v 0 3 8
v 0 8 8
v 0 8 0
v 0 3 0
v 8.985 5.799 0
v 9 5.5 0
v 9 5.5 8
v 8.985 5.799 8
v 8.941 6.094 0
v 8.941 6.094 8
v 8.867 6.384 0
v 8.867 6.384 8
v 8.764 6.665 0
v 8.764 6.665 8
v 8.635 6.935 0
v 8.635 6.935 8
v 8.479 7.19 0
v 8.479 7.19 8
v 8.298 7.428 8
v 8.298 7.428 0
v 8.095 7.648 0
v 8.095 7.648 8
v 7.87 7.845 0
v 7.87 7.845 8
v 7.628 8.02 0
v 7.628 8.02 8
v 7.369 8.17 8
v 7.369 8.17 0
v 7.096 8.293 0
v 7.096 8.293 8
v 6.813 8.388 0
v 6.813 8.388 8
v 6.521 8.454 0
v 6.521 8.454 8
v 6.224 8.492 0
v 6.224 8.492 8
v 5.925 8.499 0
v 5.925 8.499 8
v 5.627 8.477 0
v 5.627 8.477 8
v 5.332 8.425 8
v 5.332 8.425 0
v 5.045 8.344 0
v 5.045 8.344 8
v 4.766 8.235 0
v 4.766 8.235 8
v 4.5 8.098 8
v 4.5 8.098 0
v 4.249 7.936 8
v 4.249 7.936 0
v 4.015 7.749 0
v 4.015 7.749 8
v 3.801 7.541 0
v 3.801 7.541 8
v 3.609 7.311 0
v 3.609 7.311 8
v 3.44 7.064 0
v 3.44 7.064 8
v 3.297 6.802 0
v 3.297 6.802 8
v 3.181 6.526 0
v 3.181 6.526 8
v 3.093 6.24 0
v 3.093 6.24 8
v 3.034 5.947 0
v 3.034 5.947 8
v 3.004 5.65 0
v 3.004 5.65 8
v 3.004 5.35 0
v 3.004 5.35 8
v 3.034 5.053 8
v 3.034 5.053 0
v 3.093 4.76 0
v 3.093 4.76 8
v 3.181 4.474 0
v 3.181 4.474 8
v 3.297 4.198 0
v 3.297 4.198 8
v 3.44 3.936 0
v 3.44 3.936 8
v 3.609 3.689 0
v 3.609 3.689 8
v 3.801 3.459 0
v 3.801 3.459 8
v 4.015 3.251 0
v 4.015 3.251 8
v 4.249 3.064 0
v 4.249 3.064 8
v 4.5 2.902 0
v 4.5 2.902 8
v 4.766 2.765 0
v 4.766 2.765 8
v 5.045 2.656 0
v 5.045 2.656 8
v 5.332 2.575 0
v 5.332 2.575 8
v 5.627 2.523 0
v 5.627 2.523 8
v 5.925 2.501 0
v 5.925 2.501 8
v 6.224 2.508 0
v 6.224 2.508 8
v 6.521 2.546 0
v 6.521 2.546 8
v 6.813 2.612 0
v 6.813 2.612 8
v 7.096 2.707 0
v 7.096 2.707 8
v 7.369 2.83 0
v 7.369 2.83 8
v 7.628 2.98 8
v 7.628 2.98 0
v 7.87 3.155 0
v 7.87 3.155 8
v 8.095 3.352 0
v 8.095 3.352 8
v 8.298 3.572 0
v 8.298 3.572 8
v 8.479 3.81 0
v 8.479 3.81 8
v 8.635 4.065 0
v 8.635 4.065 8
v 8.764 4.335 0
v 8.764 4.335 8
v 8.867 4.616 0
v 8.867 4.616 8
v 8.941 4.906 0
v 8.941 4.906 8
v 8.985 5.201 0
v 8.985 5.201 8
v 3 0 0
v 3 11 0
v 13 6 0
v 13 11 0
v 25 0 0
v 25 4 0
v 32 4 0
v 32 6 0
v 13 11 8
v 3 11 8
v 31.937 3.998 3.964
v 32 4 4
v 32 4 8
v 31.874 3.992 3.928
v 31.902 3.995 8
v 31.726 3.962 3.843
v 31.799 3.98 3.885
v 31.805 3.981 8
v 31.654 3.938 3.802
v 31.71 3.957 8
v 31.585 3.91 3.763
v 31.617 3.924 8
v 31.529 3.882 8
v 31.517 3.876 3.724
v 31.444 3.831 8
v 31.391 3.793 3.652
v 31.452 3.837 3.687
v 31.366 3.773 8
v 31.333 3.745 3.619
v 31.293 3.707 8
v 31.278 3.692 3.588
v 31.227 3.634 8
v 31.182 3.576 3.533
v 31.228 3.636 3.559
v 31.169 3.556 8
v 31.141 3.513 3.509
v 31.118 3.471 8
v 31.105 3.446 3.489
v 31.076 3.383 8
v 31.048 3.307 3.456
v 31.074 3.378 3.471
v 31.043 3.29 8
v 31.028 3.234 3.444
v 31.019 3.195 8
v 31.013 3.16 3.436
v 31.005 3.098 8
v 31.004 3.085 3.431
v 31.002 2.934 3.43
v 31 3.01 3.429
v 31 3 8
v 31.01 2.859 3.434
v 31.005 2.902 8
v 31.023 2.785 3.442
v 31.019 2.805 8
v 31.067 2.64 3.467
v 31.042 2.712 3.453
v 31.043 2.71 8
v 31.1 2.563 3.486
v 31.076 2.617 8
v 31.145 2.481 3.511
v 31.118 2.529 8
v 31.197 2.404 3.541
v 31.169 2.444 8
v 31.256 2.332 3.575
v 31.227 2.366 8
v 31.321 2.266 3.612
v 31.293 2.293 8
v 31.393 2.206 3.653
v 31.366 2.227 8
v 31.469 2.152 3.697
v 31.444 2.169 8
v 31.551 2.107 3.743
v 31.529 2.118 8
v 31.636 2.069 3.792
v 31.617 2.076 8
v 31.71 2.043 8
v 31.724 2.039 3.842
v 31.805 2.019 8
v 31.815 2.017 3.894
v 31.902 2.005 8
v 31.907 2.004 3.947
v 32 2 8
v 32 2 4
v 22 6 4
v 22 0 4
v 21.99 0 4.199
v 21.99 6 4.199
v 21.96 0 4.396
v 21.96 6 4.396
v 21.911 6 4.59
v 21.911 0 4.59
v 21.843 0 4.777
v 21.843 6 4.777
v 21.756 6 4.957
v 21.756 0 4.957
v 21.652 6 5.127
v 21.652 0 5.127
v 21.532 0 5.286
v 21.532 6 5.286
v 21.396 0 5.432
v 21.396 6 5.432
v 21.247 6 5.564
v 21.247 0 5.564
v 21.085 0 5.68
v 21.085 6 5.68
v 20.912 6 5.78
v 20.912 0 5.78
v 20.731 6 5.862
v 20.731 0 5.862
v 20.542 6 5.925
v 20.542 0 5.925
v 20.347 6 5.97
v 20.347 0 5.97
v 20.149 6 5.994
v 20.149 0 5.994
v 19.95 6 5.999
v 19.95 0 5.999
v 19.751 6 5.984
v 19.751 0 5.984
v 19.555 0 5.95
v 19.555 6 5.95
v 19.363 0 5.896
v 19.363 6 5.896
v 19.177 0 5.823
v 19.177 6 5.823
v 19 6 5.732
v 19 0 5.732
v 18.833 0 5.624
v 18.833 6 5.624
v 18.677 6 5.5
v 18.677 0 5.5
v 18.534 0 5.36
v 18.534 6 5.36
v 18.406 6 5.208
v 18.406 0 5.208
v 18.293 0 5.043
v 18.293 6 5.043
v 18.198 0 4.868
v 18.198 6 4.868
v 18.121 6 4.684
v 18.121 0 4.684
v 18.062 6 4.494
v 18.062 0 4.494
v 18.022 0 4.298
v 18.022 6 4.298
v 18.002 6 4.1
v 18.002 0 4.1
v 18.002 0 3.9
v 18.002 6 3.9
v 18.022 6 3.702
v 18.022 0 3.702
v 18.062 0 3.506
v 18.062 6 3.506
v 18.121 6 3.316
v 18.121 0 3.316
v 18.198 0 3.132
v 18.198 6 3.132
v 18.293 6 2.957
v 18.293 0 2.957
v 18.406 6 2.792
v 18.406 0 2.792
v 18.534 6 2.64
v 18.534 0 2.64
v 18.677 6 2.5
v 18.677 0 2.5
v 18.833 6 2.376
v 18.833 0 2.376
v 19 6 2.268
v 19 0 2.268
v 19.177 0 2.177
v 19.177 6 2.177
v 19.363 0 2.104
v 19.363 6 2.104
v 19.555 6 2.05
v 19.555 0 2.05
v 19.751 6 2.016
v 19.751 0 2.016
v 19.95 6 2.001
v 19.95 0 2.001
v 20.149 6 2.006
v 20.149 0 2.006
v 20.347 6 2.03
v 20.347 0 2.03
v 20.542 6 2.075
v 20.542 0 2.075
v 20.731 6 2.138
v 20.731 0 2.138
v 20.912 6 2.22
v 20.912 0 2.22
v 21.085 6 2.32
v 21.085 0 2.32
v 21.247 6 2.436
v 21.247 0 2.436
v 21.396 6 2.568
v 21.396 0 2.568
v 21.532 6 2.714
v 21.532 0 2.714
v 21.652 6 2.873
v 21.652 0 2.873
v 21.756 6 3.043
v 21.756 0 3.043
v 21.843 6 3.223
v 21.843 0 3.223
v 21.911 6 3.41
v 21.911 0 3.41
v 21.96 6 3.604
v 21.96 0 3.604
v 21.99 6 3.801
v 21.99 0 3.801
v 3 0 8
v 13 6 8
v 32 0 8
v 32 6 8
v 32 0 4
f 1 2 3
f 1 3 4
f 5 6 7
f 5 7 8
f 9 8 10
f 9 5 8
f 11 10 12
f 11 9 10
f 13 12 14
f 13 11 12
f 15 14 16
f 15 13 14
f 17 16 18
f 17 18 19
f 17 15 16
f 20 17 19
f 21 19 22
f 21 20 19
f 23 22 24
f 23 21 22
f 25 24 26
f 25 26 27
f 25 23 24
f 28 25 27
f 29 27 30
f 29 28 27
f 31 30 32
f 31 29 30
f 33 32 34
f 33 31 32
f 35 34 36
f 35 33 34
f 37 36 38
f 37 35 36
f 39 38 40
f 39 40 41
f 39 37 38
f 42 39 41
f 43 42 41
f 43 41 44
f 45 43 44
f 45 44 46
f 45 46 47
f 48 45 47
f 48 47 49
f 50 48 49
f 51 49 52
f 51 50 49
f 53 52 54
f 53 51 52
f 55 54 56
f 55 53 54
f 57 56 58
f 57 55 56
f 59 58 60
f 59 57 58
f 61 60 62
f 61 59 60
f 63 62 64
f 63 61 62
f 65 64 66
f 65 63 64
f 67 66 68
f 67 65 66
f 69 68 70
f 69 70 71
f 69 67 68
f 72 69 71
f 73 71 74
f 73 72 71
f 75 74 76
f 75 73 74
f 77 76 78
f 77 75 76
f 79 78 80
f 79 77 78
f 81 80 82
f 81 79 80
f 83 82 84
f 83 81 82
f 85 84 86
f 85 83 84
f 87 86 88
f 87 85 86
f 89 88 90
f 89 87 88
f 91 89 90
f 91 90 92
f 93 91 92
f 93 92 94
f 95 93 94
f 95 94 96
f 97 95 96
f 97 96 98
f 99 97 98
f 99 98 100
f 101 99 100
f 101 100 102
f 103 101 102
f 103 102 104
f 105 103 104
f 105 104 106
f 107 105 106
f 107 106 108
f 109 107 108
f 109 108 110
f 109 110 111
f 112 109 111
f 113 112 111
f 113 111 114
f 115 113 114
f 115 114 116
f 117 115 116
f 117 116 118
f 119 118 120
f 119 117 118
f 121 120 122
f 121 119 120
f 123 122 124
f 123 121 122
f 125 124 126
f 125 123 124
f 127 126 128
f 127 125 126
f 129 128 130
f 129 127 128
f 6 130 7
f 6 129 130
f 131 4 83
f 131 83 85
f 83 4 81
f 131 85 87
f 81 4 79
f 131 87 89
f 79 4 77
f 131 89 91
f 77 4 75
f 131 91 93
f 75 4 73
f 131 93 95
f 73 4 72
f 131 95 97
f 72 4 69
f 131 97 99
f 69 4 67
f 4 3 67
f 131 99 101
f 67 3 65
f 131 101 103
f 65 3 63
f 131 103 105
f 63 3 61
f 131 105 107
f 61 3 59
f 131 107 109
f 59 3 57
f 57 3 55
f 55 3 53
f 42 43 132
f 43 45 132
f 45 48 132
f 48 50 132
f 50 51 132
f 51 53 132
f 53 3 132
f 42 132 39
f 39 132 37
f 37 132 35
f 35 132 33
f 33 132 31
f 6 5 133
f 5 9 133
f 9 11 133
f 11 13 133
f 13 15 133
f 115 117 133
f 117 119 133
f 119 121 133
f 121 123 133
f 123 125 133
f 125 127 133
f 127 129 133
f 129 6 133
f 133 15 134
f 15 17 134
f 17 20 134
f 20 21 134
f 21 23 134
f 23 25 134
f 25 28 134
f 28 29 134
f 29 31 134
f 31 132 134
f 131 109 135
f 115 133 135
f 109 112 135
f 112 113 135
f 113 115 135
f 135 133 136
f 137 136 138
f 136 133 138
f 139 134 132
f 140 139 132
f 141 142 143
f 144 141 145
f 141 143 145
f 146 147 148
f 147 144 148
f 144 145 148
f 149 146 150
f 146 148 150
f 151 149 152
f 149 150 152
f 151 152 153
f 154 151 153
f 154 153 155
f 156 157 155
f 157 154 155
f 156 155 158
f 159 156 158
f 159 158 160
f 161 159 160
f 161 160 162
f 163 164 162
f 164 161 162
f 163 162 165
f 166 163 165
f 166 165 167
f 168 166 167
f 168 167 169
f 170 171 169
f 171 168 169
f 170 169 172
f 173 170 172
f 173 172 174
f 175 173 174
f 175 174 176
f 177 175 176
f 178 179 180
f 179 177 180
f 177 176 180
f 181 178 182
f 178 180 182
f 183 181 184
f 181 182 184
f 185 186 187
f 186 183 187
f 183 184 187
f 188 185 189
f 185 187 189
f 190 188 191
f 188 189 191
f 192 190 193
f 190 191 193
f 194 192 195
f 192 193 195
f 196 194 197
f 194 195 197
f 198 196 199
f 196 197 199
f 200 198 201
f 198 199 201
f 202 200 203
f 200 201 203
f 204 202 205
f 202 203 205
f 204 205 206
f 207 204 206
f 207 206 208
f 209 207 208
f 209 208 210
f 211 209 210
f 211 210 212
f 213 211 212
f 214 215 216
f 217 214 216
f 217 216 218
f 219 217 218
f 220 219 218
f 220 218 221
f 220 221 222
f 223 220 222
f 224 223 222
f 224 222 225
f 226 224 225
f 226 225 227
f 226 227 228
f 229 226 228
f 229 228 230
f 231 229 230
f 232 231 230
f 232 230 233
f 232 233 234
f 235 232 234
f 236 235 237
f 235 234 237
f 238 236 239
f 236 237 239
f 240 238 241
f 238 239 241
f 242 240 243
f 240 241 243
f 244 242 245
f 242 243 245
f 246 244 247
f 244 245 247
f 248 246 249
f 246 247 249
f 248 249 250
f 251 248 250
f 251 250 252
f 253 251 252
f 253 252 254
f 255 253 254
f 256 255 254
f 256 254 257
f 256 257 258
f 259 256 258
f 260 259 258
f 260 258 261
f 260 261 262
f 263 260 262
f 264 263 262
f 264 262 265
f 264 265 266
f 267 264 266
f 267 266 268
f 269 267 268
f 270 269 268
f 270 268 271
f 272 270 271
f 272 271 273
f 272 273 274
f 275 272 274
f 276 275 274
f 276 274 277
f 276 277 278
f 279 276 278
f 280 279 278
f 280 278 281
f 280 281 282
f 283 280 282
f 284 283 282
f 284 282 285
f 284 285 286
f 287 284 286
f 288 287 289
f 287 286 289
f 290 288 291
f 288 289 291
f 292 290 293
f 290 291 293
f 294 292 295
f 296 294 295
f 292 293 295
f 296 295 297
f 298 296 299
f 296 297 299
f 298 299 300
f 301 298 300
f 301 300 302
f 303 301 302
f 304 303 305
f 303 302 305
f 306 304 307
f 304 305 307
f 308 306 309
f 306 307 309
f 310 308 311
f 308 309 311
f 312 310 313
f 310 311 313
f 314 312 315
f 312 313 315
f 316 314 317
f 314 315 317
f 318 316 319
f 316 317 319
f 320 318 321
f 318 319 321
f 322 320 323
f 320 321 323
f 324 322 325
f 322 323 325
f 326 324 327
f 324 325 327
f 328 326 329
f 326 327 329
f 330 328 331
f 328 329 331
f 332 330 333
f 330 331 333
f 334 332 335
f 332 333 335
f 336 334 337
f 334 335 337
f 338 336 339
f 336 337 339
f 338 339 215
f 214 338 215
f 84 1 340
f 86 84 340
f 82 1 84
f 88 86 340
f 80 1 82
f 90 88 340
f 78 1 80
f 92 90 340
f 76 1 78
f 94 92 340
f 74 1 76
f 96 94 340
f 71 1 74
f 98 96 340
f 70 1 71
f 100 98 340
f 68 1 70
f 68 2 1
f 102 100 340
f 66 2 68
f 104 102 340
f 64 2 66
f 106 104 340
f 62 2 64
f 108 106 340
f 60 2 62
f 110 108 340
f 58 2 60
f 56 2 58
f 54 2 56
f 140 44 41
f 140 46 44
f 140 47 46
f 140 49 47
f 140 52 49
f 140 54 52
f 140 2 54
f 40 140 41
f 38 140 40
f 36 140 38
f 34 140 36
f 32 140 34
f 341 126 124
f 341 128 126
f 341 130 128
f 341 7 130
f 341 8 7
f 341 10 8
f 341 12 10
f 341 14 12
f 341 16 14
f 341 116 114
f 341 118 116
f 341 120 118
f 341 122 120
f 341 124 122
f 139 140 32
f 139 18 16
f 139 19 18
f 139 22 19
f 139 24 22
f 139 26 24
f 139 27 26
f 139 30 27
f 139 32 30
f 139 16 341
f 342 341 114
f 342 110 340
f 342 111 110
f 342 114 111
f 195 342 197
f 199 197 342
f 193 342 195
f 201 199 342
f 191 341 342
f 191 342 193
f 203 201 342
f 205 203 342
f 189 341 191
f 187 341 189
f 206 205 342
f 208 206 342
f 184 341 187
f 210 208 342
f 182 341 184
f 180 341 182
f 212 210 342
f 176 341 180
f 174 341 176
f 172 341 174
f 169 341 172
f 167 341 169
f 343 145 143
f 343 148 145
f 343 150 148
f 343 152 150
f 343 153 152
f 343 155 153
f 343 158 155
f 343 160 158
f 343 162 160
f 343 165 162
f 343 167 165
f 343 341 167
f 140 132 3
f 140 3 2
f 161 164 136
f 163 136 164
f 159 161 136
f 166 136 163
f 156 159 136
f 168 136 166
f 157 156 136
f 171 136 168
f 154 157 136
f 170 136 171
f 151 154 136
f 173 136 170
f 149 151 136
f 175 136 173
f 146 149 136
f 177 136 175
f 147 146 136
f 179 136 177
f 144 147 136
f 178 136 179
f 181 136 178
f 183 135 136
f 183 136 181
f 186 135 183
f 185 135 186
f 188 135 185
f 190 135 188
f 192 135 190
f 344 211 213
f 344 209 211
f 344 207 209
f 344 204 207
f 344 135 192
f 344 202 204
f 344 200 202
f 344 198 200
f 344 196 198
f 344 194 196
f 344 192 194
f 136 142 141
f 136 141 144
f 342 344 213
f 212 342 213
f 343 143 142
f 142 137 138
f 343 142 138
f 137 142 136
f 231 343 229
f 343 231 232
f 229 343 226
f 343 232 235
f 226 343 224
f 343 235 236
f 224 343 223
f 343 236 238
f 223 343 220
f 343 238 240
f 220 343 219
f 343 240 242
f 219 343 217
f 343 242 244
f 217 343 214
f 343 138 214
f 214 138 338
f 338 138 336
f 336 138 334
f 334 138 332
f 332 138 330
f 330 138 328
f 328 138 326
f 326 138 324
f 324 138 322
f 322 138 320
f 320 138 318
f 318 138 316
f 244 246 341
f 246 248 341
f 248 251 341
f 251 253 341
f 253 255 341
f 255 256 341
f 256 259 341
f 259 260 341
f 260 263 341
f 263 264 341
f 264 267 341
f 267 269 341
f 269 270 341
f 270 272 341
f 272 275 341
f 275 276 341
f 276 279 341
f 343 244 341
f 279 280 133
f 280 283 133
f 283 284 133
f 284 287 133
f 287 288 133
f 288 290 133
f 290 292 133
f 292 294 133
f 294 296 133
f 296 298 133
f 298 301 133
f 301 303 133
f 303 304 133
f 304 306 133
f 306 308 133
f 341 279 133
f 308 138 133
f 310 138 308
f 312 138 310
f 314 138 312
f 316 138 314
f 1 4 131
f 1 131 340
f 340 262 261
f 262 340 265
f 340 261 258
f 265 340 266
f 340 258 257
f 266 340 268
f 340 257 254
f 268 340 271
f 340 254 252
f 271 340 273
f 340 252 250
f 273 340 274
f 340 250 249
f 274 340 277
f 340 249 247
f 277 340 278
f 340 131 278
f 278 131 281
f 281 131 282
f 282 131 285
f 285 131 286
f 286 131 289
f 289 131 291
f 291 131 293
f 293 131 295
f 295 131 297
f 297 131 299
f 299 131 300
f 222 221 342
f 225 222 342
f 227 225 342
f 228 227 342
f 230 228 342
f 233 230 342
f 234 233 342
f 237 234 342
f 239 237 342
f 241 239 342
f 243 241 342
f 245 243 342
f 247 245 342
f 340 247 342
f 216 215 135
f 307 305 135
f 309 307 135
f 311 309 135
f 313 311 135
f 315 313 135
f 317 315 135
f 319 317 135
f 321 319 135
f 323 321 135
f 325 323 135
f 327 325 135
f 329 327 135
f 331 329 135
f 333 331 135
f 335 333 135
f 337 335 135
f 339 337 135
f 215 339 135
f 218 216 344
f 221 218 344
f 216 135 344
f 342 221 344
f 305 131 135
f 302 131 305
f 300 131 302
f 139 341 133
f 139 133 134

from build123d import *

# Parameters (mm, degrees)
ESQUISSE1_R             = 3
EXTRUSION1_DEPTH        = 8
ESQUISSE2_R             = 1
ENL_V_MAT_EXTRU_1_DEPTH = 9
ENL_V_MAT_EXTRU_4_DEPTH = 4
ESQUISSE4_R             = 2
ENL_V_MAT_EXTRU_5_DEPTH = 12
CHANFREIN1_SIZE         = 3


with BuildPart() as part:
    # Esquisse1 → Extrusion1 (new body)
    with BuildSketch(Plane.XY):
        Polygon((32, 6), (13, 6), (13, 11), (0, 11), (0, 0), (32, 0), align=None)
        with Locations((6, 5.5)):
            Circle(ESQUISSE1_R, mode=Mode.SUBTRACT)
    extrude(amount=EXTRUSION1_DEPTH)

    # Esquisse2 → Enlèv. mat.-Extru.1 (cut, through all)
    with BuildSketch(Plane.XY.offset(8)):
        with Locations((32, 3)):
            Circle(ESQUISSE2_R)
    extrude(amount=-ENL_V_MAT_EXTRU_1_DEPTH, mode=Mode.SUBTRACT)

    # Esquisse3 → Enlèv. mat.-Extru.4 (cut)
    with BuildSketch(Plane.XZ):
        Polygon((25, 0), (32, 4), (32, 0), align=None)
    extrude(amount=-ENL_V_MAT_EXTRU_4_DEPTH, mode=Mode.SUBTRACT)

    # Esquisse4 → Enlèv. mat.-Extru.5 (cut, through all)
    with BuildSketch(Plane.XZ):
        with Locations((20, 4)):
            Circle(ESQUISSE4_R)
    extrude(amount=-ENL_V_MAT_EXTRU_5_DEPTH, mode=Mode.SUBTRACT)

    # Chanfrein1
    chanfrein1_edges = [part.edges().sort_by_distance(p)[0] for p in [
        (0, 0, 4),
        (0, 11, 4),
    ]]
    chamfer(chanfrein1_edges, length=CHANFREIN1_SIZE)


solid = part.part
